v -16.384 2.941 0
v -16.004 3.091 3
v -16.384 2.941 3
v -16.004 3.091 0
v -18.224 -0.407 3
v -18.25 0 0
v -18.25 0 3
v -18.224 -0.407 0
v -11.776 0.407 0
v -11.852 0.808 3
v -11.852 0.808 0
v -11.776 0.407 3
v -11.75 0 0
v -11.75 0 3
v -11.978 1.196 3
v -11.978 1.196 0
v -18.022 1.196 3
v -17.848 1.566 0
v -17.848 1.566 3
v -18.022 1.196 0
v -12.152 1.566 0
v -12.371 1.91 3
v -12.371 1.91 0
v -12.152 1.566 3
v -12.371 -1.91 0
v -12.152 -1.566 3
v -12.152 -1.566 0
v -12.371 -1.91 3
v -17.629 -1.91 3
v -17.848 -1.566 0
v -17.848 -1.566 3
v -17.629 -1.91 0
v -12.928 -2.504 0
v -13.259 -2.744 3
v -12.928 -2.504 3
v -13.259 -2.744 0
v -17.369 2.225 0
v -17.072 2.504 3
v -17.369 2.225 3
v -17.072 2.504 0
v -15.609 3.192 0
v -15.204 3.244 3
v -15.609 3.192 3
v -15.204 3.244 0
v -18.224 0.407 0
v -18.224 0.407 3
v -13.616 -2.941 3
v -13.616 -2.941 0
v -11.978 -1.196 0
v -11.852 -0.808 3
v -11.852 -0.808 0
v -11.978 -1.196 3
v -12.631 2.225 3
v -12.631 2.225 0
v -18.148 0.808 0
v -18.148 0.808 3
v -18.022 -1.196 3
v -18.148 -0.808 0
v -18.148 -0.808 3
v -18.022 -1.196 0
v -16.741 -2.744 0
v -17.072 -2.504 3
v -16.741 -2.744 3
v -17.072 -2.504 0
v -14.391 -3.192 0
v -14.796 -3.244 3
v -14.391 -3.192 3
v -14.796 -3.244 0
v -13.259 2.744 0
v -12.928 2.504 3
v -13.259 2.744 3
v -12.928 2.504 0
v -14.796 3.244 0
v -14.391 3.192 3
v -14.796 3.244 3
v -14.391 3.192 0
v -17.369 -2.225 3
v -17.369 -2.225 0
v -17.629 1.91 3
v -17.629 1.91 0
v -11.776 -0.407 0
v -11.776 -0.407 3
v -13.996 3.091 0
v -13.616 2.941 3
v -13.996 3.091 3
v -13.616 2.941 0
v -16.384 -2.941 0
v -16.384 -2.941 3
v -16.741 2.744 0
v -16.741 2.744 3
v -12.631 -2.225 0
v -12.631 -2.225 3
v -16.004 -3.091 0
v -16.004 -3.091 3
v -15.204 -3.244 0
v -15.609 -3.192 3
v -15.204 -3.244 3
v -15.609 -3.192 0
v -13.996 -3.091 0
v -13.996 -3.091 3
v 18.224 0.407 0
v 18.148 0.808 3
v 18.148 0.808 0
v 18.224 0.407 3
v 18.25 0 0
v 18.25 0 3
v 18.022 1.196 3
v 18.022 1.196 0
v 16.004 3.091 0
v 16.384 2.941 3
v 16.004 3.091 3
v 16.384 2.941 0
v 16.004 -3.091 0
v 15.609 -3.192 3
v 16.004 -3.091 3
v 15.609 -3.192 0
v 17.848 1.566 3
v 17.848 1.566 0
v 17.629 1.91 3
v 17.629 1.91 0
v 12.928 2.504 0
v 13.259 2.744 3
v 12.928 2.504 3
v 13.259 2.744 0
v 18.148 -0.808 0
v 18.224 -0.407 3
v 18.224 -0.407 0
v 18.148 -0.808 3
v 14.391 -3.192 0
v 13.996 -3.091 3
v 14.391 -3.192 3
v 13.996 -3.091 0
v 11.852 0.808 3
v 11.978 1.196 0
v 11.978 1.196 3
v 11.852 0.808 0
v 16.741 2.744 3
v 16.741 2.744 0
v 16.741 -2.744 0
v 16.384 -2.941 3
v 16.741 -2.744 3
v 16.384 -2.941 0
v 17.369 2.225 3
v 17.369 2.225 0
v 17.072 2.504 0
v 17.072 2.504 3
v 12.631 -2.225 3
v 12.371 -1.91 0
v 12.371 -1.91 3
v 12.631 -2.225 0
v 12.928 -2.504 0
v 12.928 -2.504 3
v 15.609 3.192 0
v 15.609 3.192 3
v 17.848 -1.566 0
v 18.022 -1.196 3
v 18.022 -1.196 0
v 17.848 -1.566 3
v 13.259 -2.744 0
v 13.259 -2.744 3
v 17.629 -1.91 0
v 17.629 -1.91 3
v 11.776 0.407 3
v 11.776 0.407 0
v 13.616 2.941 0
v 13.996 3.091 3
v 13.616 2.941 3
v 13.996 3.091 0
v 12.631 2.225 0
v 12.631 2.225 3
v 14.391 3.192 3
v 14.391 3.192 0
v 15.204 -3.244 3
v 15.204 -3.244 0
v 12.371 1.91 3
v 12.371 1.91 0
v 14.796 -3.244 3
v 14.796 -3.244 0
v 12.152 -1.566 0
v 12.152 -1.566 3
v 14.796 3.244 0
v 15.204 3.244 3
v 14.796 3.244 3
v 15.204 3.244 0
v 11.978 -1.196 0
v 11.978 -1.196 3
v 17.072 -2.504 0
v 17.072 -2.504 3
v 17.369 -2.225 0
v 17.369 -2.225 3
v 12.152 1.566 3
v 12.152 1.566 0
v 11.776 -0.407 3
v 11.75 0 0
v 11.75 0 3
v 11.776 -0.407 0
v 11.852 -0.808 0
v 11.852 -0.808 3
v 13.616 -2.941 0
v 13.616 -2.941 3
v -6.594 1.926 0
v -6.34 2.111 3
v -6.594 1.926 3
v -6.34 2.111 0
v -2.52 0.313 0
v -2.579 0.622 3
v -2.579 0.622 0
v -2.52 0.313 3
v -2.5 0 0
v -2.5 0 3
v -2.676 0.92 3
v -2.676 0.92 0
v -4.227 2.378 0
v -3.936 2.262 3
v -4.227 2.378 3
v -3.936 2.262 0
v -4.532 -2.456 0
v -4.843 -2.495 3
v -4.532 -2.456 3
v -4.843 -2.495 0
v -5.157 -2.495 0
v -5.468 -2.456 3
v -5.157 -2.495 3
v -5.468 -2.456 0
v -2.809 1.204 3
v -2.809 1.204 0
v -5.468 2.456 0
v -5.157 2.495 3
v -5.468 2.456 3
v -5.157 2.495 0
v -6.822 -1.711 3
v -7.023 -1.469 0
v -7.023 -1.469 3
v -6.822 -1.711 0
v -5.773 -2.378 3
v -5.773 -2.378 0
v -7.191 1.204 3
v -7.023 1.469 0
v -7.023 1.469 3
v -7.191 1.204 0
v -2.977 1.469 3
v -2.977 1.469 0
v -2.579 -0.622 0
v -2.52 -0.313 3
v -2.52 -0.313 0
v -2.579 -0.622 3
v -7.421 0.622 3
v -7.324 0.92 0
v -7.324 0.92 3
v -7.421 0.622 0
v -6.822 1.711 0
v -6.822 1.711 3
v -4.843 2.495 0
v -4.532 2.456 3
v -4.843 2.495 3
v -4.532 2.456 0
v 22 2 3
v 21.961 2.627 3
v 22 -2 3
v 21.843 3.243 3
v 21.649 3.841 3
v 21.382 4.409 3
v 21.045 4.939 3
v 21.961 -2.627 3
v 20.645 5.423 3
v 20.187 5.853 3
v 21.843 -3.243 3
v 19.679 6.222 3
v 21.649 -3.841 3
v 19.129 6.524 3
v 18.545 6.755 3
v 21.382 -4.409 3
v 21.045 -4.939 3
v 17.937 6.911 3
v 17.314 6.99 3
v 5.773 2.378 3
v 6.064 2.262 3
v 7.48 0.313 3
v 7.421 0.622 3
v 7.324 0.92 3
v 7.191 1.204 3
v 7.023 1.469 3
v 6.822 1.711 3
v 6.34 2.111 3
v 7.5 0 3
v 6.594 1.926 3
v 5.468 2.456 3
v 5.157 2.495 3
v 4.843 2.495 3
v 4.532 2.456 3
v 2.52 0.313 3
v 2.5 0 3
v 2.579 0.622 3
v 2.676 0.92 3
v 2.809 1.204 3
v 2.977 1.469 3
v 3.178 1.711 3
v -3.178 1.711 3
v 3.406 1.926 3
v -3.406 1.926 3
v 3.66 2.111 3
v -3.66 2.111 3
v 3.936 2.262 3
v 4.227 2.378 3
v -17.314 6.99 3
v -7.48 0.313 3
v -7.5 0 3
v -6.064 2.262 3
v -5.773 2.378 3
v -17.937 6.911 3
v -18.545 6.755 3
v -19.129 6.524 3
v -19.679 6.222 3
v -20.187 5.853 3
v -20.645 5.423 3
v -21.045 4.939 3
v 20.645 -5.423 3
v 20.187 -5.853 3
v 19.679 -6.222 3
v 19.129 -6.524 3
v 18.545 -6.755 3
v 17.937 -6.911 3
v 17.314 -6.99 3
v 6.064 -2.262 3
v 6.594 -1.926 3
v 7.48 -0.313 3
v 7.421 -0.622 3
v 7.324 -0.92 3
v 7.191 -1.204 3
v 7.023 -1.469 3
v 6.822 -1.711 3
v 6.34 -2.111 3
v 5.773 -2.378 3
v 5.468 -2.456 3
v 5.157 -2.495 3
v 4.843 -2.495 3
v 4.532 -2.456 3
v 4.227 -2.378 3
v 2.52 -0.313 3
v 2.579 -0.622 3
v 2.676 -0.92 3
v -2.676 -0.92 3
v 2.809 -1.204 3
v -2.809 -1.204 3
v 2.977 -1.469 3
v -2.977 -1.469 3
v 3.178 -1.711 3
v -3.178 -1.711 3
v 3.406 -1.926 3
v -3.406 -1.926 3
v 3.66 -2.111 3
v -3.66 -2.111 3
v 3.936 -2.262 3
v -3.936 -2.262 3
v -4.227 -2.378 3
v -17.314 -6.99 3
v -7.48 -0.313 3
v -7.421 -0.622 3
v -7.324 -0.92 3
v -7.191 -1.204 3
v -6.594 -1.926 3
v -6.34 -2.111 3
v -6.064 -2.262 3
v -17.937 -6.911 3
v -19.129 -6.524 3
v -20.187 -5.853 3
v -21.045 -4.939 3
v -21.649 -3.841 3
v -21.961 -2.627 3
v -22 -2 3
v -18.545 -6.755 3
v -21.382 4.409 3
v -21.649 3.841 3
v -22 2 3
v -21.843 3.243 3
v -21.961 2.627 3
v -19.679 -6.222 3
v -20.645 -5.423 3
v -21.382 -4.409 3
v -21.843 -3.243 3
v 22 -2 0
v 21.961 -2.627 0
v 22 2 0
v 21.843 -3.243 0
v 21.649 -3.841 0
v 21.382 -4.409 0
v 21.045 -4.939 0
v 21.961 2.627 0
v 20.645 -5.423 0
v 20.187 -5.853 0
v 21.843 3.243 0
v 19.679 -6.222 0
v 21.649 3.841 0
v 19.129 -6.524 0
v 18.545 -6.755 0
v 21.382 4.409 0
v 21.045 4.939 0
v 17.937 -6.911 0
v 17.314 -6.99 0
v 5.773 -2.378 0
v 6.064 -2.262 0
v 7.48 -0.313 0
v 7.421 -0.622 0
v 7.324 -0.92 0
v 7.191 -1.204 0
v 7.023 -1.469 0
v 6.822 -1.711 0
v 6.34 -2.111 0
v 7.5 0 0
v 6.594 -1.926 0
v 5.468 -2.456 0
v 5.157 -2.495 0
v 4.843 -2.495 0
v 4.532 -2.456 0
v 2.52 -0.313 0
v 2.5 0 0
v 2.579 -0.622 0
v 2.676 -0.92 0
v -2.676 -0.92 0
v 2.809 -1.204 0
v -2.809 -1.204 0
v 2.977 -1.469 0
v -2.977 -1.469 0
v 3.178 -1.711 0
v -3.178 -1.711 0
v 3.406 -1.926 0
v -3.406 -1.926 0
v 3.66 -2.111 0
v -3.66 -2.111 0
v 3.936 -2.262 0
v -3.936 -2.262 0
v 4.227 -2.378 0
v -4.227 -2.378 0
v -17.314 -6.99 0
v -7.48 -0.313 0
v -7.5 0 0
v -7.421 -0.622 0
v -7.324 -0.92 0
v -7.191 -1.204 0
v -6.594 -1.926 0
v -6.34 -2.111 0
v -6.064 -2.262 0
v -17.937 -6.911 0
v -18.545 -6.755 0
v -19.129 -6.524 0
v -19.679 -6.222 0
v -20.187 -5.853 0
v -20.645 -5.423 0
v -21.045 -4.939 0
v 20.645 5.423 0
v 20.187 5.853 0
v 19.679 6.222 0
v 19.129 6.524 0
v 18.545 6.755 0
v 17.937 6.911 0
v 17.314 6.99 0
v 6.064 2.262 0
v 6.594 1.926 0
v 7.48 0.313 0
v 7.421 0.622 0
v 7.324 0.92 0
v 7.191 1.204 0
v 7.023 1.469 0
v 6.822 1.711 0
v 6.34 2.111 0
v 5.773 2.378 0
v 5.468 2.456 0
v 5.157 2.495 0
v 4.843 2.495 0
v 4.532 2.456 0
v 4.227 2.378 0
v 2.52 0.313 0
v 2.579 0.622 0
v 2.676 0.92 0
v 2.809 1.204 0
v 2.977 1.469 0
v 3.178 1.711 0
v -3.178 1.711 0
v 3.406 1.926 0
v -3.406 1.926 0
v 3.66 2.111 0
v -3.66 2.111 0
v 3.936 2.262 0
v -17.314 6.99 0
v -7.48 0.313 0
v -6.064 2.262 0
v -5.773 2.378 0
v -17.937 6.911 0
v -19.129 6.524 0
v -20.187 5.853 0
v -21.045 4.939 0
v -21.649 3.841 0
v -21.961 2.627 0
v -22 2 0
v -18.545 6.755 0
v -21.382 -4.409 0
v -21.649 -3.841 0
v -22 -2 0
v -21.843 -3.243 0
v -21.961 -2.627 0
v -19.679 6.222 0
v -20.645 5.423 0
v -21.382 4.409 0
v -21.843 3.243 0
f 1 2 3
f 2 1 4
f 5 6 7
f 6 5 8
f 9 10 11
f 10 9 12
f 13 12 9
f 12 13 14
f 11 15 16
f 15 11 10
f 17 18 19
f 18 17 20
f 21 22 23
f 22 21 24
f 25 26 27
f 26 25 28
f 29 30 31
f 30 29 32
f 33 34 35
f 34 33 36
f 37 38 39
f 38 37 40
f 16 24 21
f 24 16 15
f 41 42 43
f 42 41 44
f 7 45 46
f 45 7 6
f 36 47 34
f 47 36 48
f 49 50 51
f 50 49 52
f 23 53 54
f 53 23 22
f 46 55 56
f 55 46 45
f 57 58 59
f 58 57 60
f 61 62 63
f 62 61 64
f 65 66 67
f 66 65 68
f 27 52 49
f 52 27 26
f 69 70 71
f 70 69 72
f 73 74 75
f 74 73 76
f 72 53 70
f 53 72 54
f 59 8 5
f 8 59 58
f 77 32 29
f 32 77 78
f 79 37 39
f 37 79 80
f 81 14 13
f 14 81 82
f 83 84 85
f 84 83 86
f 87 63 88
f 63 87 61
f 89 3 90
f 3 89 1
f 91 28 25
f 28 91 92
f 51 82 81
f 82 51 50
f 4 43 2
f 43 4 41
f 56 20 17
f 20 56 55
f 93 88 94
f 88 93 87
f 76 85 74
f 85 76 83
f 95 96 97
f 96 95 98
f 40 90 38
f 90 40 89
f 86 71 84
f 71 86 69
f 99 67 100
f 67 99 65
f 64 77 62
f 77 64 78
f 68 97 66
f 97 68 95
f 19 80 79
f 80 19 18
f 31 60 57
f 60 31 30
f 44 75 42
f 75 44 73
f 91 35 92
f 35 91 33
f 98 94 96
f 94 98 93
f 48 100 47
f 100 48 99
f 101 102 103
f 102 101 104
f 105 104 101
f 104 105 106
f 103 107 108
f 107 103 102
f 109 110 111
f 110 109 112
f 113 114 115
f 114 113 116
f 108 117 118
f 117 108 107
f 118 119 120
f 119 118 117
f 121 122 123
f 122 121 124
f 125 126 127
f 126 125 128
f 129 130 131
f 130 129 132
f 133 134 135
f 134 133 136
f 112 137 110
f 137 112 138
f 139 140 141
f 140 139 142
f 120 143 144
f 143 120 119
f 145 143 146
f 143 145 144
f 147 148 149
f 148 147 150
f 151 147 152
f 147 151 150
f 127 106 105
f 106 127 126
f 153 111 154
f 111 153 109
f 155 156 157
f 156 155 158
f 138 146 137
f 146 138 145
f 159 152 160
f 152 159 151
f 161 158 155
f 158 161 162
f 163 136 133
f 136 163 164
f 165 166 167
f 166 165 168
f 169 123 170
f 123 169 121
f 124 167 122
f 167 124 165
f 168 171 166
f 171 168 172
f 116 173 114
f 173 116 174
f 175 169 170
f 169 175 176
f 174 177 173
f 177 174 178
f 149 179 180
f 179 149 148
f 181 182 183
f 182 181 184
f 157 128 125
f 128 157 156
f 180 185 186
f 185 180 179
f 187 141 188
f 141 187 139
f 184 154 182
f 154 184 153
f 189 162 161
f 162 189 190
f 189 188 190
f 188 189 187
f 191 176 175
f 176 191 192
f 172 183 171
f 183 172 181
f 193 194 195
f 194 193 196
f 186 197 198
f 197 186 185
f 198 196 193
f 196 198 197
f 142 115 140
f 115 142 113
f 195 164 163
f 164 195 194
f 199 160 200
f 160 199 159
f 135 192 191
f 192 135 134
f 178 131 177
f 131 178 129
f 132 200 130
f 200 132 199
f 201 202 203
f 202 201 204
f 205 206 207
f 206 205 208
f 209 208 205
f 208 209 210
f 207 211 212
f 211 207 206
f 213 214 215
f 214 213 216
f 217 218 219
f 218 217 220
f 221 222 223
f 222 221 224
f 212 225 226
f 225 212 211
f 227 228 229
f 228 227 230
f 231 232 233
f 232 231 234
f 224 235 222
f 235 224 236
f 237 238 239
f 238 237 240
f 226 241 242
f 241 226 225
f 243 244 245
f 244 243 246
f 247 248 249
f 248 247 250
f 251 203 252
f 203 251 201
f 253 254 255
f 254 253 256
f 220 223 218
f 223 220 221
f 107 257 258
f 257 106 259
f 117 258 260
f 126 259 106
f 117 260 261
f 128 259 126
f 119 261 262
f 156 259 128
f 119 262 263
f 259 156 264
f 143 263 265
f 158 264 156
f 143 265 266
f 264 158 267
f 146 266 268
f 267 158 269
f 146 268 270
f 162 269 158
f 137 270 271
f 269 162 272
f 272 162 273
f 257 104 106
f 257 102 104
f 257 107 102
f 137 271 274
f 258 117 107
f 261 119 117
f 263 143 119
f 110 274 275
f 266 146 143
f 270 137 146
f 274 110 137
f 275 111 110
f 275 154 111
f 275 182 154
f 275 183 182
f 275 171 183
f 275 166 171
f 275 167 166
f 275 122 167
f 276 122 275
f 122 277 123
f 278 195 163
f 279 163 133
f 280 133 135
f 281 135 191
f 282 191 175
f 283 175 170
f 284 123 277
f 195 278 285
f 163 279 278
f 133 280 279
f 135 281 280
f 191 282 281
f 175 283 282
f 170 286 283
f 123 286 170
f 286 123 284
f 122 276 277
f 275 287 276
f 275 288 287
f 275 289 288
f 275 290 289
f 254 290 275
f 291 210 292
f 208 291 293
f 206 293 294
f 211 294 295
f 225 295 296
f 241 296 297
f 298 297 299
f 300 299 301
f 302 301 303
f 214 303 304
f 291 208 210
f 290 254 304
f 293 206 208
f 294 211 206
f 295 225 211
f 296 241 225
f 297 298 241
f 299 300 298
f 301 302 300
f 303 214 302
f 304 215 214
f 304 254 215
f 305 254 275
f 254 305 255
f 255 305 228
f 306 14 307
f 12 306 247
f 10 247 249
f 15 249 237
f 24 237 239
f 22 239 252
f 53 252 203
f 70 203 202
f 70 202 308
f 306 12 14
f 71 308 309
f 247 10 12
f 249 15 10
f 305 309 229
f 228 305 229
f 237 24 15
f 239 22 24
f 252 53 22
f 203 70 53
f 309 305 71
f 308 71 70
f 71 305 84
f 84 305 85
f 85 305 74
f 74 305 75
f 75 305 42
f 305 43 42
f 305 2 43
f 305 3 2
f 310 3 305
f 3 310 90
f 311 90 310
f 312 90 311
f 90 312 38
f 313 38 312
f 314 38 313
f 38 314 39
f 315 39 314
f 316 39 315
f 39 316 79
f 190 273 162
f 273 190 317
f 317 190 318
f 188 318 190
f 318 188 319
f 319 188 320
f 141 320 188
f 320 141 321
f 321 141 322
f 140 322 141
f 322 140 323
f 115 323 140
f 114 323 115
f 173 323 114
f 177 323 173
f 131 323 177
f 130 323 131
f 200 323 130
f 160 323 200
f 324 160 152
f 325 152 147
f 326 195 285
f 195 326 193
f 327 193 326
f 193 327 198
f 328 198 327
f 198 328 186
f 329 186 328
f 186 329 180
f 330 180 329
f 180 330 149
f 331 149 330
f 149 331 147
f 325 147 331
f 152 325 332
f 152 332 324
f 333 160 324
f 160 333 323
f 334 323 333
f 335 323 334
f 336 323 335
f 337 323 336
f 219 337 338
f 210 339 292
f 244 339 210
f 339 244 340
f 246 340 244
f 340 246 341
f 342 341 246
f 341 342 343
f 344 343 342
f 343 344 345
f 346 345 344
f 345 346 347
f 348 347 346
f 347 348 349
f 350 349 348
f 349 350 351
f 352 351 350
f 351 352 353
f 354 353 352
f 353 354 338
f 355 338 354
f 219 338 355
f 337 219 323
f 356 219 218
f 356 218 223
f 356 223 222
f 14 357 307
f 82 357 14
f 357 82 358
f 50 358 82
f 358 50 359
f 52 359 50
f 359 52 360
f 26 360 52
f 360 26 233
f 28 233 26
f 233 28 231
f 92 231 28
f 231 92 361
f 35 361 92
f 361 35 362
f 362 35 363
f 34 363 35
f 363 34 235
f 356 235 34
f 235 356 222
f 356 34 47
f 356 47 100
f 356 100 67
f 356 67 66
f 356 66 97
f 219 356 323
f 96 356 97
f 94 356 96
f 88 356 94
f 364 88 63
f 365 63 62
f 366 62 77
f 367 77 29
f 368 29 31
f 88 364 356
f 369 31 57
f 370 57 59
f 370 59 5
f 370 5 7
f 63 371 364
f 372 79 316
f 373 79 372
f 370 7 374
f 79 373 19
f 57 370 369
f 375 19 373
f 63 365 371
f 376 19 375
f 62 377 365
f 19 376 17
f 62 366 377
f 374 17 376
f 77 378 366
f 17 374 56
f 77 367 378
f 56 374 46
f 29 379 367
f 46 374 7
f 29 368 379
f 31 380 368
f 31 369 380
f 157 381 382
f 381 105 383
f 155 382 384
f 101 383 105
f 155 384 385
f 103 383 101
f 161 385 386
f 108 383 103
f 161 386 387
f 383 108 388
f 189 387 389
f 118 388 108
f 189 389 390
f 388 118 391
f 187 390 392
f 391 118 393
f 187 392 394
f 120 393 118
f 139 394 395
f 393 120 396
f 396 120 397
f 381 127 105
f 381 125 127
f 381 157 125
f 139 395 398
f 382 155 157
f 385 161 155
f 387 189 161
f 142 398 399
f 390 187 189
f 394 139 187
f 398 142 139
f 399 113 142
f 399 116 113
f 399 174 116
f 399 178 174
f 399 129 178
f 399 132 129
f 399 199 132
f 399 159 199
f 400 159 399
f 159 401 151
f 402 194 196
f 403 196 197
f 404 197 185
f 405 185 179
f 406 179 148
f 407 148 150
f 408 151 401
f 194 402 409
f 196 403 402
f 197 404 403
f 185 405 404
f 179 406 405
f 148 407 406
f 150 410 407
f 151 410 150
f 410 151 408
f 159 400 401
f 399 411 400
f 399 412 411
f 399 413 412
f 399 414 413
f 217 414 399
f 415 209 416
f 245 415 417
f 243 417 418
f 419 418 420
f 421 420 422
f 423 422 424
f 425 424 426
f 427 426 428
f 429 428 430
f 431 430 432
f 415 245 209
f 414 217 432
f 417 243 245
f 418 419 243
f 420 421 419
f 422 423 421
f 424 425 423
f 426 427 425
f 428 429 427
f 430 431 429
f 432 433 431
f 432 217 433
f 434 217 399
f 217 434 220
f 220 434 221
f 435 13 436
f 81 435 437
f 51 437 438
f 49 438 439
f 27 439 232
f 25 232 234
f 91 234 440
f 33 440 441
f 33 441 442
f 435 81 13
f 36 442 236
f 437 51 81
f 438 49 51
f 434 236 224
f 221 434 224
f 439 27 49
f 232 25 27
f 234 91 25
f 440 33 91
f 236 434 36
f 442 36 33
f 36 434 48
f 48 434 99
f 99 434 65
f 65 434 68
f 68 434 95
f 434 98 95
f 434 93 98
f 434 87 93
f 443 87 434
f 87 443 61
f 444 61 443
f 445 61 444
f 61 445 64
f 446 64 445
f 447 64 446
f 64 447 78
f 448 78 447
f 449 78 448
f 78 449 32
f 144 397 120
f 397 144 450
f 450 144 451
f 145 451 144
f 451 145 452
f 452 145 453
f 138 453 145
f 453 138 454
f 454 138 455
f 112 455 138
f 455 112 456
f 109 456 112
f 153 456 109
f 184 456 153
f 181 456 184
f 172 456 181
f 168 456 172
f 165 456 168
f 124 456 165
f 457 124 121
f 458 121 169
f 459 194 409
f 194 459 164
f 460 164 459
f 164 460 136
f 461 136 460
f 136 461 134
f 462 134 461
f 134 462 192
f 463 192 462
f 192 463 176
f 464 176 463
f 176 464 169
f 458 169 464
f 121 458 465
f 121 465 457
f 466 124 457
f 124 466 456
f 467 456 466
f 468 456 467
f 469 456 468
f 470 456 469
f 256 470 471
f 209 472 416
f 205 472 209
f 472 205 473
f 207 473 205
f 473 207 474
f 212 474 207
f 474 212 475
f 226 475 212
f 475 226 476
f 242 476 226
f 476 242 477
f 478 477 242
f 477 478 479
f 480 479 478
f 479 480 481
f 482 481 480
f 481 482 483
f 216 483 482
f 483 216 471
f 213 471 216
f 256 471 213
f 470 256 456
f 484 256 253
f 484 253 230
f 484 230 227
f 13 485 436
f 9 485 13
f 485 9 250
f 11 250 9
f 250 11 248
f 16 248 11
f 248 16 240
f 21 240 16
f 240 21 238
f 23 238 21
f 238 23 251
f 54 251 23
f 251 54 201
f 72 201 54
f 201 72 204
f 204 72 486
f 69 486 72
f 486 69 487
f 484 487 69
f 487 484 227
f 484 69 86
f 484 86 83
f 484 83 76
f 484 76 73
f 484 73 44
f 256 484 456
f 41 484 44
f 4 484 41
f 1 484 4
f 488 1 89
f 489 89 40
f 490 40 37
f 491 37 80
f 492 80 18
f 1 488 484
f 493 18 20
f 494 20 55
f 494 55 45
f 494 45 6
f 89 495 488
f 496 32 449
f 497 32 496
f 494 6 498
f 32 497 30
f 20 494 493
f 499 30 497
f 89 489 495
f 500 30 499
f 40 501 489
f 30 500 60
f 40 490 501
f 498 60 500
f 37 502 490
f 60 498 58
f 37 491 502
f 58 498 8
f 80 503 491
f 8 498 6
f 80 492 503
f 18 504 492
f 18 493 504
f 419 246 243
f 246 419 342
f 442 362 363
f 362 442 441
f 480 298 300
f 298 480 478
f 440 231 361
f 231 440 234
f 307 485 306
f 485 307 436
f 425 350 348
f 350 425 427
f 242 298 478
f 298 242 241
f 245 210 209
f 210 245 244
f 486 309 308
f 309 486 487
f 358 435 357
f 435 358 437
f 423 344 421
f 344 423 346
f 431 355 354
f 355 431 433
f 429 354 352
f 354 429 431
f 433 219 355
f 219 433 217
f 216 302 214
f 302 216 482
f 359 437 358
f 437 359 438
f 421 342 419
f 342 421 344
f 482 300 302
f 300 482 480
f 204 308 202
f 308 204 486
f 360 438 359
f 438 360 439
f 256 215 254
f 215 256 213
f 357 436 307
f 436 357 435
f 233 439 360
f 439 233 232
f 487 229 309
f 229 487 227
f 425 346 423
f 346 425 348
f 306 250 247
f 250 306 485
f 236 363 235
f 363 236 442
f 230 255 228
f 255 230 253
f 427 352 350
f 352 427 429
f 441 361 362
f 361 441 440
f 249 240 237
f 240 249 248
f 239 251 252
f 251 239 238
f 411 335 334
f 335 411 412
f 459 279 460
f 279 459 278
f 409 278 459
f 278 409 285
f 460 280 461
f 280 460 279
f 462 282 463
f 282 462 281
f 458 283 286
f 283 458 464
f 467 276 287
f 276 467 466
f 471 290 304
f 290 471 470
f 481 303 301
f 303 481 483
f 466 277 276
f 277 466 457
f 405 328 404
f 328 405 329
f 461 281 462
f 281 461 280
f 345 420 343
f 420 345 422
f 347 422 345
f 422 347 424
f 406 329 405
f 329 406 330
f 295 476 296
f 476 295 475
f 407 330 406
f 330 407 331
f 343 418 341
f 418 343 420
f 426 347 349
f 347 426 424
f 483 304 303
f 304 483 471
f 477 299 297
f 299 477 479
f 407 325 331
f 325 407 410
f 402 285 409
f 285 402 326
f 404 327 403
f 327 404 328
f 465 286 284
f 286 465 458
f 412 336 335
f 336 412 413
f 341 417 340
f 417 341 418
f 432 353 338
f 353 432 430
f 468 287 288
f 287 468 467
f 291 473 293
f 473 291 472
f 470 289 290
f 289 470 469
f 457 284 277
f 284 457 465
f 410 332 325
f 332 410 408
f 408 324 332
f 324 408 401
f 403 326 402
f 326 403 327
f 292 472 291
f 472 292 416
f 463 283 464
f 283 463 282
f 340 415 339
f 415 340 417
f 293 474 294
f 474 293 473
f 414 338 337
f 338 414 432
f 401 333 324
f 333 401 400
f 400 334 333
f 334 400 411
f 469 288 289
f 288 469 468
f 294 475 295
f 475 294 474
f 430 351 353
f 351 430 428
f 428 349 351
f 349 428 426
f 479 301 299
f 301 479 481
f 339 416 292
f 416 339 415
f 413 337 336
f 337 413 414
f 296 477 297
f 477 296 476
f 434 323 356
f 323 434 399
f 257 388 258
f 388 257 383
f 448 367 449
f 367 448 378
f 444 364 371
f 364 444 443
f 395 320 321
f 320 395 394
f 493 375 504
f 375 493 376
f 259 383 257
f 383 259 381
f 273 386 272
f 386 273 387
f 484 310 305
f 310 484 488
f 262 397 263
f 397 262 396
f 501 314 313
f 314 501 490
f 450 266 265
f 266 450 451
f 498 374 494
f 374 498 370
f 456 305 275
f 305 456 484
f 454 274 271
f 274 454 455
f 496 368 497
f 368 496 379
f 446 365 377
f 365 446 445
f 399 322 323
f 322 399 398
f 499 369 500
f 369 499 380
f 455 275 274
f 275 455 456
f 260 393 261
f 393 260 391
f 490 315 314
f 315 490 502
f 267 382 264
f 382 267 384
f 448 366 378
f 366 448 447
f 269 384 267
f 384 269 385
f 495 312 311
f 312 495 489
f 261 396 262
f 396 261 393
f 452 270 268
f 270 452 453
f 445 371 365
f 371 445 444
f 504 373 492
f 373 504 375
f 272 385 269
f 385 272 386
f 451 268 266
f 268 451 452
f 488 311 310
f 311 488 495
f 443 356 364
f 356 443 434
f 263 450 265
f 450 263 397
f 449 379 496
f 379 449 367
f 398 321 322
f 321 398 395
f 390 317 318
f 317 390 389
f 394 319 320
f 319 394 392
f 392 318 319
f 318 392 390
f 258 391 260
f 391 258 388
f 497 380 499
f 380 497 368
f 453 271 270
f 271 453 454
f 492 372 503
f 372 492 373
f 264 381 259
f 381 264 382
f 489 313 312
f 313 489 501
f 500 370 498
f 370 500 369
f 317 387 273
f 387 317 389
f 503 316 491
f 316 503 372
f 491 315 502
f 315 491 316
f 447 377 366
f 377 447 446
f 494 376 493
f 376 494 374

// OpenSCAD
$fn = 50;

difference() {
	union() {
		hull() {
			translate(v = [-17.0, 2.0, 0]) {
				cylinder(h = 3, r = 5);
			}
			translate(v = [17.0, 2.0, 0]) {
				cylinder(h = 3, r = 5);
			}
			translate(v = [-17.0, -2.0, 0]) {
				cylinder(h = 3, r = 5);
			}
			translate(v = [17.0, -2.0, 0]) {
				cylinder(h = 3, r = 5);
			}
		}
	}
	union() {
		translate(v = [-15.0, 0.0, -100.0]) {
			cylinder(h = 200, r = 3.25);
		}
		translate(v = [15.0, 0.0, -100.0]) {
			cylinder(h = 200, r = 3.25);
		}
		translate(v = [-15.0, 0.0, -100.0]) {
			cylinder(h = 200, r = 1.8);
		}
		translate(v = [15.0, 0.0, -100.0]) {
			cylinder(h = 200, r = 1.8);
		}
		translate(v = [-15.0, 0, 0.0]) {
			cylinder(h = 3, r = 2.5);
		}
		translate(v = [-5.0, 0, 0.0]) {
			cylinder(h = 3, r = 2.5);
		}
		translate(v = [5.0, 0, 0.0]) {
			cylinder(h = 3, r = 2.5);
		}
		translate(v = [15.0, 0, 0.0]) {
			cylinder(h = 3, r = 2.5);
		}
	}
}
